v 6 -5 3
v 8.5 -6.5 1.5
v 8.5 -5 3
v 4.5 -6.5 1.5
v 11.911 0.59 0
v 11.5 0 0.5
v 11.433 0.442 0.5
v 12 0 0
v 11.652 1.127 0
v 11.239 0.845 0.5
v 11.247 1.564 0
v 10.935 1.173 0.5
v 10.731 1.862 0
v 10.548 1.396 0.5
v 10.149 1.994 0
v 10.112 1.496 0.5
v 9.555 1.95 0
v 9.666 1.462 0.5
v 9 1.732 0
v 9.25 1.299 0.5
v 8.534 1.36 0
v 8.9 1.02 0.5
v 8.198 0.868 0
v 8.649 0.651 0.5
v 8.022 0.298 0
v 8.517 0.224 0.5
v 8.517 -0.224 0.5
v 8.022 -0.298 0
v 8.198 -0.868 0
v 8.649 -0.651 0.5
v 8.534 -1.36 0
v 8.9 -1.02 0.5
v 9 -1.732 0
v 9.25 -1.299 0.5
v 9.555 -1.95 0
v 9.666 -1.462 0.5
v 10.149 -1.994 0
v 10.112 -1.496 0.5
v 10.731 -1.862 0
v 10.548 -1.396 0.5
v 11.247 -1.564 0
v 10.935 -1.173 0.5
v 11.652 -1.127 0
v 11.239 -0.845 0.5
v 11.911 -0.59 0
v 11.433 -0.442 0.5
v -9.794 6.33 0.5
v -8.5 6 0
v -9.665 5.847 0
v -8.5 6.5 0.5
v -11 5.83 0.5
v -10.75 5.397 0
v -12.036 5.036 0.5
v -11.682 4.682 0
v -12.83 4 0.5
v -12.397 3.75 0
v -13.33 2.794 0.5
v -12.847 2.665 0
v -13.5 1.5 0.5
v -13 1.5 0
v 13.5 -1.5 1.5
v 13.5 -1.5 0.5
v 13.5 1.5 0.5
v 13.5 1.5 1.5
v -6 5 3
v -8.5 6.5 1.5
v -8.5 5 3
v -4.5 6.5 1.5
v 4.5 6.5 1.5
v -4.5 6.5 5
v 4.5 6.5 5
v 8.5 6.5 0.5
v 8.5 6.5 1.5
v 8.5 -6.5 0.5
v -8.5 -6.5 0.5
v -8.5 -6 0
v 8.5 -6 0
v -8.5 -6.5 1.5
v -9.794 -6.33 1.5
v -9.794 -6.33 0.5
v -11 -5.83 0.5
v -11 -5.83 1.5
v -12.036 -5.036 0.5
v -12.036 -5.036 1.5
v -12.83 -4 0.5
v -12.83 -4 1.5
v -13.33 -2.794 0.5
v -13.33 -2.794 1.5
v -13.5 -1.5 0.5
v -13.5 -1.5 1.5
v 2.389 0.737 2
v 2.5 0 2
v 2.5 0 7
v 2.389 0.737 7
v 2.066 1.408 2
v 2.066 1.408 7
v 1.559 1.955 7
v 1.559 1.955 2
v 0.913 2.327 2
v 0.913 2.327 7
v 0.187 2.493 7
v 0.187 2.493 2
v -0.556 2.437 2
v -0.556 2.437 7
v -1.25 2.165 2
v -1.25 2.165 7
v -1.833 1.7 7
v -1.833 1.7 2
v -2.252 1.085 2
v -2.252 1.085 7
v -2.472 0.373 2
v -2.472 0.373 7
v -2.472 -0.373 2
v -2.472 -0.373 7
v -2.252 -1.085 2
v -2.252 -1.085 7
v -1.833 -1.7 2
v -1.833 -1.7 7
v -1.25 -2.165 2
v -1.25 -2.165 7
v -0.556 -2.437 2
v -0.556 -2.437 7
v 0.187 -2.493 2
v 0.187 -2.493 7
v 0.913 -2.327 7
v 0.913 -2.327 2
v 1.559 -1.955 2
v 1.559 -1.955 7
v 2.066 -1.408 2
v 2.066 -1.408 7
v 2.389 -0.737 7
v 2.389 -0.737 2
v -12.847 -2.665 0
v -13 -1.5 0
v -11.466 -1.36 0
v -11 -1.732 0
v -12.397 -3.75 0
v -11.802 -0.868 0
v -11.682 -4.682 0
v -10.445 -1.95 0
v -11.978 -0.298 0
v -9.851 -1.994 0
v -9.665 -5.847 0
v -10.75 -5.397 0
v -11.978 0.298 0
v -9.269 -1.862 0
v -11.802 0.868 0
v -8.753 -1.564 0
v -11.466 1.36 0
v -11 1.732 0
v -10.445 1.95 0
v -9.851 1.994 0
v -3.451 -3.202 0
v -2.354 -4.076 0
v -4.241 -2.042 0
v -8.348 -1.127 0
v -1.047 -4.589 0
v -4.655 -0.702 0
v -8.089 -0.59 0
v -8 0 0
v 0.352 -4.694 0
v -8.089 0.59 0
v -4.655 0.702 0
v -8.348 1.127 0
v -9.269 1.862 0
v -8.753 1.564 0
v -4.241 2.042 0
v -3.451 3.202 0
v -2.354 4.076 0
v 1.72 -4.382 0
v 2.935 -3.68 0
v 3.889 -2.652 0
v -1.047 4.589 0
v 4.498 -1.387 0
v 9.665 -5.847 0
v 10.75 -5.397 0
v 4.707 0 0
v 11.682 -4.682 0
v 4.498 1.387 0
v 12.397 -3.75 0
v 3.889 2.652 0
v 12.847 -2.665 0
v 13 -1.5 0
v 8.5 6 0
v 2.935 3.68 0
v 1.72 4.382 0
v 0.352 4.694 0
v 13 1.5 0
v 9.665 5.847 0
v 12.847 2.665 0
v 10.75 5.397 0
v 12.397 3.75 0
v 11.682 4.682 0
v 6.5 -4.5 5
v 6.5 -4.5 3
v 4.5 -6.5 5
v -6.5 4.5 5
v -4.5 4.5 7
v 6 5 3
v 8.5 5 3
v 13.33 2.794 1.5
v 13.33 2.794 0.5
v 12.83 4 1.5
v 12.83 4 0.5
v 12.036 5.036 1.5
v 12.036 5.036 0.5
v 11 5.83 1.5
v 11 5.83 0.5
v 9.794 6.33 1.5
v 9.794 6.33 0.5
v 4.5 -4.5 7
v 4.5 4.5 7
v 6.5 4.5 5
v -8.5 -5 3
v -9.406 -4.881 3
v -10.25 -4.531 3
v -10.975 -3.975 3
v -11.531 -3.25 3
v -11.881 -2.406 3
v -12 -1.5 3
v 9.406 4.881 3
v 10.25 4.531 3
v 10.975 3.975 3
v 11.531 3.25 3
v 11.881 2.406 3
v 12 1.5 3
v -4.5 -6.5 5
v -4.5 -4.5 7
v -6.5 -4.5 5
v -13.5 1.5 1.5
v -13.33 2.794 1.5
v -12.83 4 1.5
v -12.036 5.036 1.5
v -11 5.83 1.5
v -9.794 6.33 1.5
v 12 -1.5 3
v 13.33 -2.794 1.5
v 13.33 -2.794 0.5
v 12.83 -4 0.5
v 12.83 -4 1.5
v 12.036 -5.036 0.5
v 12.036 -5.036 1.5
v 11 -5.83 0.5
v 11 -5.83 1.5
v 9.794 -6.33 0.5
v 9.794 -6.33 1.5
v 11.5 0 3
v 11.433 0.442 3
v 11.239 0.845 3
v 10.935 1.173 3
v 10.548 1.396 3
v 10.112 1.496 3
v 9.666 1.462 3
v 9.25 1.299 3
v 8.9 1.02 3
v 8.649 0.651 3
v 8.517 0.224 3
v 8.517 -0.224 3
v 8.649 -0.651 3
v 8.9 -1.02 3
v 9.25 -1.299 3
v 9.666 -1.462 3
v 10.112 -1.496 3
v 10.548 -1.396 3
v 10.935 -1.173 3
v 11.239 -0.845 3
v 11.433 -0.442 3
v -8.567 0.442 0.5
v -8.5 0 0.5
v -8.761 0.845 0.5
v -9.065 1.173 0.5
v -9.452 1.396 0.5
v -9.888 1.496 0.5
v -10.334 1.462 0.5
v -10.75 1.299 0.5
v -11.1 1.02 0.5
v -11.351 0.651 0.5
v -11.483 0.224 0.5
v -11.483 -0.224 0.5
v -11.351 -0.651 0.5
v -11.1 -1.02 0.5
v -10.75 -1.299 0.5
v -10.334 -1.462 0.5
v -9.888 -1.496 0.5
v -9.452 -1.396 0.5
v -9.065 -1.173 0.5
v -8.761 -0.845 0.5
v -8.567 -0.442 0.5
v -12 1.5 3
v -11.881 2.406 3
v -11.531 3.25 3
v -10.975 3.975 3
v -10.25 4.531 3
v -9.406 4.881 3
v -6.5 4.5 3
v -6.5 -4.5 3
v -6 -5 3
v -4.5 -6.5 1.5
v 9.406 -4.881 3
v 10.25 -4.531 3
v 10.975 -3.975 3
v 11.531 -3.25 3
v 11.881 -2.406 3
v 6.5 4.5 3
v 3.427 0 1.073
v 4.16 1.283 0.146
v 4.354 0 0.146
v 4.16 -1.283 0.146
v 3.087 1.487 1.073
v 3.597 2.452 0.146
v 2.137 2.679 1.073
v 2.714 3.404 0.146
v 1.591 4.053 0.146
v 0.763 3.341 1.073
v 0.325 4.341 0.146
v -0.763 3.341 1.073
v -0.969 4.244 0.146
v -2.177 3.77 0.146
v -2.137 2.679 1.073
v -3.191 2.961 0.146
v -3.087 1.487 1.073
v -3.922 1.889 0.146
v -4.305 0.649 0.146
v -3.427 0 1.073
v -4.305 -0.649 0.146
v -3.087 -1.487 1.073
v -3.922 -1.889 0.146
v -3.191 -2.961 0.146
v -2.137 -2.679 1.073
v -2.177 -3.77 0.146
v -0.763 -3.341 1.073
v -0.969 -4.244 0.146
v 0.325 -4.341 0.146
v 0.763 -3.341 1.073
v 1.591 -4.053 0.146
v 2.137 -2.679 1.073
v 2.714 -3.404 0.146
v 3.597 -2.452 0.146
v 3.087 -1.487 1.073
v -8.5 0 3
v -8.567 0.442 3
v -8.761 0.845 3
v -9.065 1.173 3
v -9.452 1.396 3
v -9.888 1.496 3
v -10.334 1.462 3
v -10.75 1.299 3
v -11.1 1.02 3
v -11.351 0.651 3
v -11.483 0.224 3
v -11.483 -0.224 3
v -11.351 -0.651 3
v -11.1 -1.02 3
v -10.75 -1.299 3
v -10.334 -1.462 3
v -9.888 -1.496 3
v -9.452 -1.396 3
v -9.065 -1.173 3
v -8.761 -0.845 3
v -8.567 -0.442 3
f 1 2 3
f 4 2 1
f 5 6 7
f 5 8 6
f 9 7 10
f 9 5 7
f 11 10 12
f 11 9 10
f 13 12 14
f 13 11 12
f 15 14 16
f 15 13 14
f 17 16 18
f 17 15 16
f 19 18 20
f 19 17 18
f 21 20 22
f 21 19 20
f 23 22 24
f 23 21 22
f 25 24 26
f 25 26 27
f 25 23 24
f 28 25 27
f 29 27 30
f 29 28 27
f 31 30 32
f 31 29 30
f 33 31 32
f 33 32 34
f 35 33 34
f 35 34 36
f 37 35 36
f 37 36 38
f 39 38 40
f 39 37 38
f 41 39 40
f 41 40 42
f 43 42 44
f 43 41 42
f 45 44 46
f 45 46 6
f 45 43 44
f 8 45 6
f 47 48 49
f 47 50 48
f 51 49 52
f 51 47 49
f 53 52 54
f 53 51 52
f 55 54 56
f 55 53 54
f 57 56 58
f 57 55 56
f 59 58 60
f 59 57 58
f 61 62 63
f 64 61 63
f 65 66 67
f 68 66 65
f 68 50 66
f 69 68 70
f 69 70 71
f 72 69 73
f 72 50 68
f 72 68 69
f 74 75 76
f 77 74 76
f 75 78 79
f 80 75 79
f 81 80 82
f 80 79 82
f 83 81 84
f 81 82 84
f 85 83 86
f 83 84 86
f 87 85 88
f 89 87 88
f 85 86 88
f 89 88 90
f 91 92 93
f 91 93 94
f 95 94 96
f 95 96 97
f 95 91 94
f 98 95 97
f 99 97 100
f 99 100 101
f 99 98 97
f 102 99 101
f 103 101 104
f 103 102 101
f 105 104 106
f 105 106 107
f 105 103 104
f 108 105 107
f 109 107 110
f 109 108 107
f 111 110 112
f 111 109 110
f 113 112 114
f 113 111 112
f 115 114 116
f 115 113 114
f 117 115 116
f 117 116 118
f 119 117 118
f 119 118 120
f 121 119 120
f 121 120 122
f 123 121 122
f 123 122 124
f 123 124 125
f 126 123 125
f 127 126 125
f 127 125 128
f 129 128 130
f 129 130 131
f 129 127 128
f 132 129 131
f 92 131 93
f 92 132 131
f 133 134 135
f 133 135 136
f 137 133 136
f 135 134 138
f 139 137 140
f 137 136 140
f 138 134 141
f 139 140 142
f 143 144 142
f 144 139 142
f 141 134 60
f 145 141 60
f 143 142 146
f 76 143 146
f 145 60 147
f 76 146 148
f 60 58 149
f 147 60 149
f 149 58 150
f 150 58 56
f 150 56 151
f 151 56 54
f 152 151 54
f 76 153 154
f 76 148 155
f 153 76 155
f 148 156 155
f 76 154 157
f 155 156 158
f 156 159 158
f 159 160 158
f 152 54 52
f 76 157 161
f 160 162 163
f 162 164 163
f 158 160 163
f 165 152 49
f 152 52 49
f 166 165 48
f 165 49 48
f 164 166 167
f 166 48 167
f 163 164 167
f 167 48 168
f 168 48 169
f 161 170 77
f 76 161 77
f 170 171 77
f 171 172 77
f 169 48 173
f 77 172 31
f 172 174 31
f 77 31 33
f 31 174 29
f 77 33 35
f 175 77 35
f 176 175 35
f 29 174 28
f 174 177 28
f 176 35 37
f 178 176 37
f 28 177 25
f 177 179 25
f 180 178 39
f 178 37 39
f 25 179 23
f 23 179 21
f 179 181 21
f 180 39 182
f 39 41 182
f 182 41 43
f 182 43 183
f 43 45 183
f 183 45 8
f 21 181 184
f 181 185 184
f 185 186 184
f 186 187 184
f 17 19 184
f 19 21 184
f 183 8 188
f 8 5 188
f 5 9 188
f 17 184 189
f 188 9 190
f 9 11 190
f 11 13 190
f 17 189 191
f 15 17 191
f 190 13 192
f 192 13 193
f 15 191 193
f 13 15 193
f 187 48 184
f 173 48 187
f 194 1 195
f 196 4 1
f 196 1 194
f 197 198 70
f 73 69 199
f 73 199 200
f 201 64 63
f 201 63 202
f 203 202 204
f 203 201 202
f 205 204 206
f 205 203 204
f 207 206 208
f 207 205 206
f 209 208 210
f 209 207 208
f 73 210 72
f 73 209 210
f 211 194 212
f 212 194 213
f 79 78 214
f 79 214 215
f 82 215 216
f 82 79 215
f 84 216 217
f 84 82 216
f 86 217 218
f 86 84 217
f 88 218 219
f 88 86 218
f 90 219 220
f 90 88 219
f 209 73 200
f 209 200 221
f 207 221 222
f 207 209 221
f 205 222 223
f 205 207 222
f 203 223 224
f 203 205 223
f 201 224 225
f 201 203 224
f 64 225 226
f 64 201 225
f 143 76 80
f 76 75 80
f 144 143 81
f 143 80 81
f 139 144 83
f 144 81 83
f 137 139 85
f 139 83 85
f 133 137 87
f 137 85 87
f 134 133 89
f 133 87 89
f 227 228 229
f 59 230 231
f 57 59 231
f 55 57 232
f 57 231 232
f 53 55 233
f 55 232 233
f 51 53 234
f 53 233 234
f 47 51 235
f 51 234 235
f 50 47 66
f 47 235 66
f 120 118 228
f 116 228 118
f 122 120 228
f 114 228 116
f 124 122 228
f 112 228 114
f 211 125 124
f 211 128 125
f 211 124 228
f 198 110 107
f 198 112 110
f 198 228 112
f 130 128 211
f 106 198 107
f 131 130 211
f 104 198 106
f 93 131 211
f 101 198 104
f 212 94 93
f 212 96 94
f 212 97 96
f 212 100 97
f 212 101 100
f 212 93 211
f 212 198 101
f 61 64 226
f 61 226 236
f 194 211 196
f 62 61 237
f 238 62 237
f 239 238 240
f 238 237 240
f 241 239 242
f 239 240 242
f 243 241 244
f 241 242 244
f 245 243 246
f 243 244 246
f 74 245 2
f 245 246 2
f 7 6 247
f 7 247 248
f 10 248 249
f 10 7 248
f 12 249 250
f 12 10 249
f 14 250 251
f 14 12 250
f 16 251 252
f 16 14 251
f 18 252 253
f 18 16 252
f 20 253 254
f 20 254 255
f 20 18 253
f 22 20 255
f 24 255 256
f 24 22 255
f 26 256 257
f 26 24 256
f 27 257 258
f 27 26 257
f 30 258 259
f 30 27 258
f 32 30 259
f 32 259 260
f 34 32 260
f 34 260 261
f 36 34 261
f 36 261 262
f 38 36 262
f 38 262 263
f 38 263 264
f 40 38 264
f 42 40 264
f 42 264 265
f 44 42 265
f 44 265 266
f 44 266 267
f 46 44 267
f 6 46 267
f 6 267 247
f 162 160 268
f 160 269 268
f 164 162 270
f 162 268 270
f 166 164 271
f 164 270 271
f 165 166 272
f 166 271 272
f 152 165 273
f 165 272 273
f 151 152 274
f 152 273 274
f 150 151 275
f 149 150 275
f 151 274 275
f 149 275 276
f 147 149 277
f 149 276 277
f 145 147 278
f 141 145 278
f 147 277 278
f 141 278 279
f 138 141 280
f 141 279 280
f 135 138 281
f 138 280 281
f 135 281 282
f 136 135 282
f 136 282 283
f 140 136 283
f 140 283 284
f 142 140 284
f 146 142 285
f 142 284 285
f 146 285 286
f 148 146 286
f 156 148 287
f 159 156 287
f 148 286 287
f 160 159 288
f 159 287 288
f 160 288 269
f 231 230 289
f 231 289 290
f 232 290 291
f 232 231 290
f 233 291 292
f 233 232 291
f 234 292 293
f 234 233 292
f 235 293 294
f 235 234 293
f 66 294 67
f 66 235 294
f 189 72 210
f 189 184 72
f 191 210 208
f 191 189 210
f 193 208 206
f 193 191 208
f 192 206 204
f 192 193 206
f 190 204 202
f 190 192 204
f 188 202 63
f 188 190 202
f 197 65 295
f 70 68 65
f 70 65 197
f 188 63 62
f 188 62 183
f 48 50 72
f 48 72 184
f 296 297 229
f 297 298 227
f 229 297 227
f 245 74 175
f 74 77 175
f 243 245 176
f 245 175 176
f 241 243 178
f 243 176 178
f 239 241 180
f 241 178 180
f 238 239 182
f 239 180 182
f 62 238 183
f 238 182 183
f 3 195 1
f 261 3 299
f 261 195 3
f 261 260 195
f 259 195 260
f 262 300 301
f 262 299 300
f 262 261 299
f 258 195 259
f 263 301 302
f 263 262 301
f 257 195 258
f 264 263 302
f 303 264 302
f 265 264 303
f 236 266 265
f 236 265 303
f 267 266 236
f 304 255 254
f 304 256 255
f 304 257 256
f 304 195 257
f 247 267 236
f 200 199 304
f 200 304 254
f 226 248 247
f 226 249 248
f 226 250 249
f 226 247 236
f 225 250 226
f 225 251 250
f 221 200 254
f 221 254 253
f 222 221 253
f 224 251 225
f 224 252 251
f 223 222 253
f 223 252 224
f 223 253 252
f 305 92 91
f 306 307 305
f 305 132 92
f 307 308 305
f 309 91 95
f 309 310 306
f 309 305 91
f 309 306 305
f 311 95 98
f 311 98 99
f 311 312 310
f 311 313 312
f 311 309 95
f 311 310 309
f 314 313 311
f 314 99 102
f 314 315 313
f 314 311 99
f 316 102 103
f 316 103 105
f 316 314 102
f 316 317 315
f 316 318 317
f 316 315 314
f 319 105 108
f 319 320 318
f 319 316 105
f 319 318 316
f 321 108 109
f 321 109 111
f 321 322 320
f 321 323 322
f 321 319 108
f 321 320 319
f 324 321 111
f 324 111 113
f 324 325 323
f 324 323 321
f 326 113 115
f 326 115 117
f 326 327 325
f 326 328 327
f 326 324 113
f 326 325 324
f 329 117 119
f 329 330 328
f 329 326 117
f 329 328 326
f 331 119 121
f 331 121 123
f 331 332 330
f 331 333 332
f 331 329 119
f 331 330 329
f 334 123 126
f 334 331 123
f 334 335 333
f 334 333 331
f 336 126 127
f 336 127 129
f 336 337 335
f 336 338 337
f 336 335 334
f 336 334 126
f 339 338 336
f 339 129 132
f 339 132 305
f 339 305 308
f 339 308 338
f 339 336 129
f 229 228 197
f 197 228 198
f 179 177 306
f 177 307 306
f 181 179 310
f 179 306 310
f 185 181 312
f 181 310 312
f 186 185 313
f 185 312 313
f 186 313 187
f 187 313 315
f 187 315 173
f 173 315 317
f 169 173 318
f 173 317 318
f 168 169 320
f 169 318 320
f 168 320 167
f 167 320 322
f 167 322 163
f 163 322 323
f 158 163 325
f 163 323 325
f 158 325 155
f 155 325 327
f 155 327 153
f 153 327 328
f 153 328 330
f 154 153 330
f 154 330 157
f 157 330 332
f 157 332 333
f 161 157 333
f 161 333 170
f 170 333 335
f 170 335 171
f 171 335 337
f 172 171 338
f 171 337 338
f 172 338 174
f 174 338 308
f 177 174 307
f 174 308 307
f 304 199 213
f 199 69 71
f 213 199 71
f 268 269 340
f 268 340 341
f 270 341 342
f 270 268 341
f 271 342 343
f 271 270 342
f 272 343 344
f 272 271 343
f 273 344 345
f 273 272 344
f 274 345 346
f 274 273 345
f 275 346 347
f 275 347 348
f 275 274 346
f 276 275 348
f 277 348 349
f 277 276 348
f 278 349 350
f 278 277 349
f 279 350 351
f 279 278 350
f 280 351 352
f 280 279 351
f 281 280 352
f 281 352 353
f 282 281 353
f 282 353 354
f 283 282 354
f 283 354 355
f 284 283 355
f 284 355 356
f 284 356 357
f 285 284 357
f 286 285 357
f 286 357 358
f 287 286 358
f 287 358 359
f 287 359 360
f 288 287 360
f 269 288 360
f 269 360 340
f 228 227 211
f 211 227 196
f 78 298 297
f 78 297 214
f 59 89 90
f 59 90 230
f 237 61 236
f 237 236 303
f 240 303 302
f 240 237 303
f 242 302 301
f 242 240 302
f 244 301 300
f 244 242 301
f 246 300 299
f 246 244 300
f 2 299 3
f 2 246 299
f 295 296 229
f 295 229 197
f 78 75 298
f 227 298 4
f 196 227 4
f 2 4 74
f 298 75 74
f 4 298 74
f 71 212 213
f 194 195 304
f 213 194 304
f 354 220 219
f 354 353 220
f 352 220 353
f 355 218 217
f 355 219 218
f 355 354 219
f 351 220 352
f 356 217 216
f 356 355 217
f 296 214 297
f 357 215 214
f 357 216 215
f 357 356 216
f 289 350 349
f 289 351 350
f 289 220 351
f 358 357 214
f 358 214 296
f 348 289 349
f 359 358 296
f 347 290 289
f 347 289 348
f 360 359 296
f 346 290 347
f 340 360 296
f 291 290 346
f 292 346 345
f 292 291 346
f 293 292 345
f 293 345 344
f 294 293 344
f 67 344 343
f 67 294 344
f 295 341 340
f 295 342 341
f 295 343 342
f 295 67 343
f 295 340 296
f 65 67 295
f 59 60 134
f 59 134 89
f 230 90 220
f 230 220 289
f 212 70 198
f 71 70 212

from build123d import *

# Parameters (mm, degrees)
F0_W         = 13
F0_H         = 13
F0_R         = 2.5
F1_DEPTH     = 7
F0_W_2       = 7
F0_R_2       = 1.5
F2_DEPTH     = 3
F3_SIZE      = 2
F4_R         = 5
F5_SIZE      = 1.5
F6_T1_DEPTH  = 3
F6_T3_DEPTH  = 17
F6_T6_ANGLE  = 90
F6_T8_ANGLE  = 90
F6_T10_ANGLE = 90
F6_T12_ANGLE = 90


# Not quite as in the source:
# - a fillet or chamfer that OpenCascade refuses, or shapes differently, is made with other operations: its cross-section is extruded or revolved along the edge and cut away or added


with BuildPart() as f1:
    # F0 (on Top) → F1 (new body)
    with BuildSketch(Plane.XY):
        Rectangle(F0_W, F0_H)
        Circle(F0_R, mode=Mode.SUBTRACT)
    extrude(amount=F1_DEPTH)

    # F0 (on Top) → F2 (join)
    with BuildSketch(Plane.XY):
        with Locations((-10, 0)):
            Rectangle(F0_W_2, F0_H)
        with Locations((-10, 0)):
            Circle(F0_R_2, mode=Mode.SUBTRACT)
        with Locations((10, 0)):
            Rectangle(F0_W_2, F0_H)
        with Locations((10, 0)):
            Circle(F0_R_2, mode=Mode.SUBTRACT)
    extrude(amount=F2_DEPTH)

    # F3
    f3_edges = [f1.edges().sort_by_distance(p)[0] for p in [
        (-2.5, 0, 0),
        (6.5, 0, 7),
        (-6.5, 0, 7),
        (0, -6.5, 7),
        (0, 6.5, 7),
        (-6.5, -6.5, 5),
        (6.5, -6.5, 5),
        (-6.5, 6.5, 5),
        (6.5, 6.5, 5),
    ]]
    chamfer(f3_edges, length=F3_SIZE)

    # F4
    f4_edges = [f1.edges().sort_by_distance(p)[0] for p in [
        (-13.5, 6.5, 1.5),
        (-13.5, -6.5, 1.5),
        (13.5, -6.5, 1.5),
        (13.5, 6.5, 1.5),
    ]]
    fillet(f4_edges, radius=F4_R)

    # F5
    f5_edges = [f1.edges().sort_by_distance(p)[0] for p in [
        (-12.035534, -5.035534, 3),
        (12.035534, -5.035534, 3),
        (7.5, 6.5, 3),
        (12.035534, 5.035534, 3),
        (13.5, 0, 3),
        (7.5, -6.5, 3),
        (-7.5, 6.5, 3),
        (-7.5, -6.5, 3),
        (-13.5, 0, 3),
        (-12.035534, 5.035534, 3),
    ]]
    chamfer(f5_edges, length=F5_SIZE)

    # F6: chamfer of 0.5 on 11 edges, made by hand

    # F6_s2 → F6_t1 (cut)
    with BuildSketch(Plane.XZ.offset(-1.5)):
        Polygon((-13, 0), (-13.5, 0.5), (-13.5, 0), align=None)
        Polygon((13.5, 0.5), (13, 0), (13.5, 0), align=None)
    extrude(amount=F6_T1_DEPTH, mode=Mode.SUBTRACT)

    # F6_s4 → F6_t3 (cut)
    with BuildSketch(Plane.YZ.offset(-8.5)):
        Polygon((6.5, 0.5), (6, 0), (6.5, 0), align=None)
        Polygon((-6.5, 0.5), (-6, 0), (-6.5, 0), align=None)
    extrude(amount=F6_T3_DEPTH, mode=Mode.SUBTRACT)

    # F6_s5 → F6_t6 (revolve, cut)
    with BuildSketch(Plane.YZ.offset(-8.5)):
        Polygon((6, 0), (6.5, 0.5), (6.5, 0), align=None)
    revolve(axis=Axis((-8.5, 1.5, 0), (0, 0, 1)), revolution_arc=F6_T6_ANGLE, mode=Mode.SUBTRACT)

    # F6_s7 → F6_t8 (revolve, cut)
    with BuildSketch(Plane.YZ.offset(-8.5)):
        Polygon((-6, 0), (-6.5, 0.5), (-6.5, 0), align=None)
    revolve(axis=Axis((-8.5, -1.5, 0), (0, 0, -1)), revolution_arc=F6_T8_ANGLE, mode=Mode.SUBTRACT)

    # F6_s9 → F6_t10 (revolve, cut)
    with BuildSketch(Plane.YZ.offset(8.5)):
        Polygon((6.5, 0.5), (6, 0), (6.5, 0), align=None)
    revolve(axis=Axis((8.5, 1.5, 0), (0, 0, -1)), revolution_arc=F6_T10_ANGLE, mode=Mode.SUBTRACT)

    # F6_s11 → F6_t12 (revolve, cut)
    with BuildSketch(Plane.YZ.offset(8.5)):
        Polygon((-6.5, 0.5), (-6, 0), (-6.5, 0), align=None)
    revolve(axis=Axis((8.5, -1.5, 0), (0, 0, 1)), revolution_arc=F6_T12_ANGLE, mode=Mode.SUBTRACT)

    # F6_s13 → F6_t14 (revolve, cut)
    with BuildSketch(Plane.XZ):
        Polygon((4.7071067812, 0), (4.3535533906, 0.1464466094), (4.5, 0), align=None)
    revolve(axis=Axis((0, 0, 0), (0, 0, 1)), mode=Mode.SUBTRACT)

    # F6_s15 → F6_t16 (revolve, cut)
    with BuildSketch(Plane.XZ):
        Polygon((11.5, 0.5), (12, 0), (11.5, 0), align=None)
    revolve(axis=Axis((10, 0, 0), (0, 0, 1)), mode=Mode.SUBTRACT)

    # F6_s17 → F6_t18 (revolve, cut)
    with BuildSketch(Plane.XZ):
        Polygon((-8, 0), (-8.5, 0.5), (-8.5, 0), align=None)
    revolve(axis=Axis((-10, 0, 0), (0, 0, 1)), mode=Mode.SUBTRACT)


solid = f1.part
